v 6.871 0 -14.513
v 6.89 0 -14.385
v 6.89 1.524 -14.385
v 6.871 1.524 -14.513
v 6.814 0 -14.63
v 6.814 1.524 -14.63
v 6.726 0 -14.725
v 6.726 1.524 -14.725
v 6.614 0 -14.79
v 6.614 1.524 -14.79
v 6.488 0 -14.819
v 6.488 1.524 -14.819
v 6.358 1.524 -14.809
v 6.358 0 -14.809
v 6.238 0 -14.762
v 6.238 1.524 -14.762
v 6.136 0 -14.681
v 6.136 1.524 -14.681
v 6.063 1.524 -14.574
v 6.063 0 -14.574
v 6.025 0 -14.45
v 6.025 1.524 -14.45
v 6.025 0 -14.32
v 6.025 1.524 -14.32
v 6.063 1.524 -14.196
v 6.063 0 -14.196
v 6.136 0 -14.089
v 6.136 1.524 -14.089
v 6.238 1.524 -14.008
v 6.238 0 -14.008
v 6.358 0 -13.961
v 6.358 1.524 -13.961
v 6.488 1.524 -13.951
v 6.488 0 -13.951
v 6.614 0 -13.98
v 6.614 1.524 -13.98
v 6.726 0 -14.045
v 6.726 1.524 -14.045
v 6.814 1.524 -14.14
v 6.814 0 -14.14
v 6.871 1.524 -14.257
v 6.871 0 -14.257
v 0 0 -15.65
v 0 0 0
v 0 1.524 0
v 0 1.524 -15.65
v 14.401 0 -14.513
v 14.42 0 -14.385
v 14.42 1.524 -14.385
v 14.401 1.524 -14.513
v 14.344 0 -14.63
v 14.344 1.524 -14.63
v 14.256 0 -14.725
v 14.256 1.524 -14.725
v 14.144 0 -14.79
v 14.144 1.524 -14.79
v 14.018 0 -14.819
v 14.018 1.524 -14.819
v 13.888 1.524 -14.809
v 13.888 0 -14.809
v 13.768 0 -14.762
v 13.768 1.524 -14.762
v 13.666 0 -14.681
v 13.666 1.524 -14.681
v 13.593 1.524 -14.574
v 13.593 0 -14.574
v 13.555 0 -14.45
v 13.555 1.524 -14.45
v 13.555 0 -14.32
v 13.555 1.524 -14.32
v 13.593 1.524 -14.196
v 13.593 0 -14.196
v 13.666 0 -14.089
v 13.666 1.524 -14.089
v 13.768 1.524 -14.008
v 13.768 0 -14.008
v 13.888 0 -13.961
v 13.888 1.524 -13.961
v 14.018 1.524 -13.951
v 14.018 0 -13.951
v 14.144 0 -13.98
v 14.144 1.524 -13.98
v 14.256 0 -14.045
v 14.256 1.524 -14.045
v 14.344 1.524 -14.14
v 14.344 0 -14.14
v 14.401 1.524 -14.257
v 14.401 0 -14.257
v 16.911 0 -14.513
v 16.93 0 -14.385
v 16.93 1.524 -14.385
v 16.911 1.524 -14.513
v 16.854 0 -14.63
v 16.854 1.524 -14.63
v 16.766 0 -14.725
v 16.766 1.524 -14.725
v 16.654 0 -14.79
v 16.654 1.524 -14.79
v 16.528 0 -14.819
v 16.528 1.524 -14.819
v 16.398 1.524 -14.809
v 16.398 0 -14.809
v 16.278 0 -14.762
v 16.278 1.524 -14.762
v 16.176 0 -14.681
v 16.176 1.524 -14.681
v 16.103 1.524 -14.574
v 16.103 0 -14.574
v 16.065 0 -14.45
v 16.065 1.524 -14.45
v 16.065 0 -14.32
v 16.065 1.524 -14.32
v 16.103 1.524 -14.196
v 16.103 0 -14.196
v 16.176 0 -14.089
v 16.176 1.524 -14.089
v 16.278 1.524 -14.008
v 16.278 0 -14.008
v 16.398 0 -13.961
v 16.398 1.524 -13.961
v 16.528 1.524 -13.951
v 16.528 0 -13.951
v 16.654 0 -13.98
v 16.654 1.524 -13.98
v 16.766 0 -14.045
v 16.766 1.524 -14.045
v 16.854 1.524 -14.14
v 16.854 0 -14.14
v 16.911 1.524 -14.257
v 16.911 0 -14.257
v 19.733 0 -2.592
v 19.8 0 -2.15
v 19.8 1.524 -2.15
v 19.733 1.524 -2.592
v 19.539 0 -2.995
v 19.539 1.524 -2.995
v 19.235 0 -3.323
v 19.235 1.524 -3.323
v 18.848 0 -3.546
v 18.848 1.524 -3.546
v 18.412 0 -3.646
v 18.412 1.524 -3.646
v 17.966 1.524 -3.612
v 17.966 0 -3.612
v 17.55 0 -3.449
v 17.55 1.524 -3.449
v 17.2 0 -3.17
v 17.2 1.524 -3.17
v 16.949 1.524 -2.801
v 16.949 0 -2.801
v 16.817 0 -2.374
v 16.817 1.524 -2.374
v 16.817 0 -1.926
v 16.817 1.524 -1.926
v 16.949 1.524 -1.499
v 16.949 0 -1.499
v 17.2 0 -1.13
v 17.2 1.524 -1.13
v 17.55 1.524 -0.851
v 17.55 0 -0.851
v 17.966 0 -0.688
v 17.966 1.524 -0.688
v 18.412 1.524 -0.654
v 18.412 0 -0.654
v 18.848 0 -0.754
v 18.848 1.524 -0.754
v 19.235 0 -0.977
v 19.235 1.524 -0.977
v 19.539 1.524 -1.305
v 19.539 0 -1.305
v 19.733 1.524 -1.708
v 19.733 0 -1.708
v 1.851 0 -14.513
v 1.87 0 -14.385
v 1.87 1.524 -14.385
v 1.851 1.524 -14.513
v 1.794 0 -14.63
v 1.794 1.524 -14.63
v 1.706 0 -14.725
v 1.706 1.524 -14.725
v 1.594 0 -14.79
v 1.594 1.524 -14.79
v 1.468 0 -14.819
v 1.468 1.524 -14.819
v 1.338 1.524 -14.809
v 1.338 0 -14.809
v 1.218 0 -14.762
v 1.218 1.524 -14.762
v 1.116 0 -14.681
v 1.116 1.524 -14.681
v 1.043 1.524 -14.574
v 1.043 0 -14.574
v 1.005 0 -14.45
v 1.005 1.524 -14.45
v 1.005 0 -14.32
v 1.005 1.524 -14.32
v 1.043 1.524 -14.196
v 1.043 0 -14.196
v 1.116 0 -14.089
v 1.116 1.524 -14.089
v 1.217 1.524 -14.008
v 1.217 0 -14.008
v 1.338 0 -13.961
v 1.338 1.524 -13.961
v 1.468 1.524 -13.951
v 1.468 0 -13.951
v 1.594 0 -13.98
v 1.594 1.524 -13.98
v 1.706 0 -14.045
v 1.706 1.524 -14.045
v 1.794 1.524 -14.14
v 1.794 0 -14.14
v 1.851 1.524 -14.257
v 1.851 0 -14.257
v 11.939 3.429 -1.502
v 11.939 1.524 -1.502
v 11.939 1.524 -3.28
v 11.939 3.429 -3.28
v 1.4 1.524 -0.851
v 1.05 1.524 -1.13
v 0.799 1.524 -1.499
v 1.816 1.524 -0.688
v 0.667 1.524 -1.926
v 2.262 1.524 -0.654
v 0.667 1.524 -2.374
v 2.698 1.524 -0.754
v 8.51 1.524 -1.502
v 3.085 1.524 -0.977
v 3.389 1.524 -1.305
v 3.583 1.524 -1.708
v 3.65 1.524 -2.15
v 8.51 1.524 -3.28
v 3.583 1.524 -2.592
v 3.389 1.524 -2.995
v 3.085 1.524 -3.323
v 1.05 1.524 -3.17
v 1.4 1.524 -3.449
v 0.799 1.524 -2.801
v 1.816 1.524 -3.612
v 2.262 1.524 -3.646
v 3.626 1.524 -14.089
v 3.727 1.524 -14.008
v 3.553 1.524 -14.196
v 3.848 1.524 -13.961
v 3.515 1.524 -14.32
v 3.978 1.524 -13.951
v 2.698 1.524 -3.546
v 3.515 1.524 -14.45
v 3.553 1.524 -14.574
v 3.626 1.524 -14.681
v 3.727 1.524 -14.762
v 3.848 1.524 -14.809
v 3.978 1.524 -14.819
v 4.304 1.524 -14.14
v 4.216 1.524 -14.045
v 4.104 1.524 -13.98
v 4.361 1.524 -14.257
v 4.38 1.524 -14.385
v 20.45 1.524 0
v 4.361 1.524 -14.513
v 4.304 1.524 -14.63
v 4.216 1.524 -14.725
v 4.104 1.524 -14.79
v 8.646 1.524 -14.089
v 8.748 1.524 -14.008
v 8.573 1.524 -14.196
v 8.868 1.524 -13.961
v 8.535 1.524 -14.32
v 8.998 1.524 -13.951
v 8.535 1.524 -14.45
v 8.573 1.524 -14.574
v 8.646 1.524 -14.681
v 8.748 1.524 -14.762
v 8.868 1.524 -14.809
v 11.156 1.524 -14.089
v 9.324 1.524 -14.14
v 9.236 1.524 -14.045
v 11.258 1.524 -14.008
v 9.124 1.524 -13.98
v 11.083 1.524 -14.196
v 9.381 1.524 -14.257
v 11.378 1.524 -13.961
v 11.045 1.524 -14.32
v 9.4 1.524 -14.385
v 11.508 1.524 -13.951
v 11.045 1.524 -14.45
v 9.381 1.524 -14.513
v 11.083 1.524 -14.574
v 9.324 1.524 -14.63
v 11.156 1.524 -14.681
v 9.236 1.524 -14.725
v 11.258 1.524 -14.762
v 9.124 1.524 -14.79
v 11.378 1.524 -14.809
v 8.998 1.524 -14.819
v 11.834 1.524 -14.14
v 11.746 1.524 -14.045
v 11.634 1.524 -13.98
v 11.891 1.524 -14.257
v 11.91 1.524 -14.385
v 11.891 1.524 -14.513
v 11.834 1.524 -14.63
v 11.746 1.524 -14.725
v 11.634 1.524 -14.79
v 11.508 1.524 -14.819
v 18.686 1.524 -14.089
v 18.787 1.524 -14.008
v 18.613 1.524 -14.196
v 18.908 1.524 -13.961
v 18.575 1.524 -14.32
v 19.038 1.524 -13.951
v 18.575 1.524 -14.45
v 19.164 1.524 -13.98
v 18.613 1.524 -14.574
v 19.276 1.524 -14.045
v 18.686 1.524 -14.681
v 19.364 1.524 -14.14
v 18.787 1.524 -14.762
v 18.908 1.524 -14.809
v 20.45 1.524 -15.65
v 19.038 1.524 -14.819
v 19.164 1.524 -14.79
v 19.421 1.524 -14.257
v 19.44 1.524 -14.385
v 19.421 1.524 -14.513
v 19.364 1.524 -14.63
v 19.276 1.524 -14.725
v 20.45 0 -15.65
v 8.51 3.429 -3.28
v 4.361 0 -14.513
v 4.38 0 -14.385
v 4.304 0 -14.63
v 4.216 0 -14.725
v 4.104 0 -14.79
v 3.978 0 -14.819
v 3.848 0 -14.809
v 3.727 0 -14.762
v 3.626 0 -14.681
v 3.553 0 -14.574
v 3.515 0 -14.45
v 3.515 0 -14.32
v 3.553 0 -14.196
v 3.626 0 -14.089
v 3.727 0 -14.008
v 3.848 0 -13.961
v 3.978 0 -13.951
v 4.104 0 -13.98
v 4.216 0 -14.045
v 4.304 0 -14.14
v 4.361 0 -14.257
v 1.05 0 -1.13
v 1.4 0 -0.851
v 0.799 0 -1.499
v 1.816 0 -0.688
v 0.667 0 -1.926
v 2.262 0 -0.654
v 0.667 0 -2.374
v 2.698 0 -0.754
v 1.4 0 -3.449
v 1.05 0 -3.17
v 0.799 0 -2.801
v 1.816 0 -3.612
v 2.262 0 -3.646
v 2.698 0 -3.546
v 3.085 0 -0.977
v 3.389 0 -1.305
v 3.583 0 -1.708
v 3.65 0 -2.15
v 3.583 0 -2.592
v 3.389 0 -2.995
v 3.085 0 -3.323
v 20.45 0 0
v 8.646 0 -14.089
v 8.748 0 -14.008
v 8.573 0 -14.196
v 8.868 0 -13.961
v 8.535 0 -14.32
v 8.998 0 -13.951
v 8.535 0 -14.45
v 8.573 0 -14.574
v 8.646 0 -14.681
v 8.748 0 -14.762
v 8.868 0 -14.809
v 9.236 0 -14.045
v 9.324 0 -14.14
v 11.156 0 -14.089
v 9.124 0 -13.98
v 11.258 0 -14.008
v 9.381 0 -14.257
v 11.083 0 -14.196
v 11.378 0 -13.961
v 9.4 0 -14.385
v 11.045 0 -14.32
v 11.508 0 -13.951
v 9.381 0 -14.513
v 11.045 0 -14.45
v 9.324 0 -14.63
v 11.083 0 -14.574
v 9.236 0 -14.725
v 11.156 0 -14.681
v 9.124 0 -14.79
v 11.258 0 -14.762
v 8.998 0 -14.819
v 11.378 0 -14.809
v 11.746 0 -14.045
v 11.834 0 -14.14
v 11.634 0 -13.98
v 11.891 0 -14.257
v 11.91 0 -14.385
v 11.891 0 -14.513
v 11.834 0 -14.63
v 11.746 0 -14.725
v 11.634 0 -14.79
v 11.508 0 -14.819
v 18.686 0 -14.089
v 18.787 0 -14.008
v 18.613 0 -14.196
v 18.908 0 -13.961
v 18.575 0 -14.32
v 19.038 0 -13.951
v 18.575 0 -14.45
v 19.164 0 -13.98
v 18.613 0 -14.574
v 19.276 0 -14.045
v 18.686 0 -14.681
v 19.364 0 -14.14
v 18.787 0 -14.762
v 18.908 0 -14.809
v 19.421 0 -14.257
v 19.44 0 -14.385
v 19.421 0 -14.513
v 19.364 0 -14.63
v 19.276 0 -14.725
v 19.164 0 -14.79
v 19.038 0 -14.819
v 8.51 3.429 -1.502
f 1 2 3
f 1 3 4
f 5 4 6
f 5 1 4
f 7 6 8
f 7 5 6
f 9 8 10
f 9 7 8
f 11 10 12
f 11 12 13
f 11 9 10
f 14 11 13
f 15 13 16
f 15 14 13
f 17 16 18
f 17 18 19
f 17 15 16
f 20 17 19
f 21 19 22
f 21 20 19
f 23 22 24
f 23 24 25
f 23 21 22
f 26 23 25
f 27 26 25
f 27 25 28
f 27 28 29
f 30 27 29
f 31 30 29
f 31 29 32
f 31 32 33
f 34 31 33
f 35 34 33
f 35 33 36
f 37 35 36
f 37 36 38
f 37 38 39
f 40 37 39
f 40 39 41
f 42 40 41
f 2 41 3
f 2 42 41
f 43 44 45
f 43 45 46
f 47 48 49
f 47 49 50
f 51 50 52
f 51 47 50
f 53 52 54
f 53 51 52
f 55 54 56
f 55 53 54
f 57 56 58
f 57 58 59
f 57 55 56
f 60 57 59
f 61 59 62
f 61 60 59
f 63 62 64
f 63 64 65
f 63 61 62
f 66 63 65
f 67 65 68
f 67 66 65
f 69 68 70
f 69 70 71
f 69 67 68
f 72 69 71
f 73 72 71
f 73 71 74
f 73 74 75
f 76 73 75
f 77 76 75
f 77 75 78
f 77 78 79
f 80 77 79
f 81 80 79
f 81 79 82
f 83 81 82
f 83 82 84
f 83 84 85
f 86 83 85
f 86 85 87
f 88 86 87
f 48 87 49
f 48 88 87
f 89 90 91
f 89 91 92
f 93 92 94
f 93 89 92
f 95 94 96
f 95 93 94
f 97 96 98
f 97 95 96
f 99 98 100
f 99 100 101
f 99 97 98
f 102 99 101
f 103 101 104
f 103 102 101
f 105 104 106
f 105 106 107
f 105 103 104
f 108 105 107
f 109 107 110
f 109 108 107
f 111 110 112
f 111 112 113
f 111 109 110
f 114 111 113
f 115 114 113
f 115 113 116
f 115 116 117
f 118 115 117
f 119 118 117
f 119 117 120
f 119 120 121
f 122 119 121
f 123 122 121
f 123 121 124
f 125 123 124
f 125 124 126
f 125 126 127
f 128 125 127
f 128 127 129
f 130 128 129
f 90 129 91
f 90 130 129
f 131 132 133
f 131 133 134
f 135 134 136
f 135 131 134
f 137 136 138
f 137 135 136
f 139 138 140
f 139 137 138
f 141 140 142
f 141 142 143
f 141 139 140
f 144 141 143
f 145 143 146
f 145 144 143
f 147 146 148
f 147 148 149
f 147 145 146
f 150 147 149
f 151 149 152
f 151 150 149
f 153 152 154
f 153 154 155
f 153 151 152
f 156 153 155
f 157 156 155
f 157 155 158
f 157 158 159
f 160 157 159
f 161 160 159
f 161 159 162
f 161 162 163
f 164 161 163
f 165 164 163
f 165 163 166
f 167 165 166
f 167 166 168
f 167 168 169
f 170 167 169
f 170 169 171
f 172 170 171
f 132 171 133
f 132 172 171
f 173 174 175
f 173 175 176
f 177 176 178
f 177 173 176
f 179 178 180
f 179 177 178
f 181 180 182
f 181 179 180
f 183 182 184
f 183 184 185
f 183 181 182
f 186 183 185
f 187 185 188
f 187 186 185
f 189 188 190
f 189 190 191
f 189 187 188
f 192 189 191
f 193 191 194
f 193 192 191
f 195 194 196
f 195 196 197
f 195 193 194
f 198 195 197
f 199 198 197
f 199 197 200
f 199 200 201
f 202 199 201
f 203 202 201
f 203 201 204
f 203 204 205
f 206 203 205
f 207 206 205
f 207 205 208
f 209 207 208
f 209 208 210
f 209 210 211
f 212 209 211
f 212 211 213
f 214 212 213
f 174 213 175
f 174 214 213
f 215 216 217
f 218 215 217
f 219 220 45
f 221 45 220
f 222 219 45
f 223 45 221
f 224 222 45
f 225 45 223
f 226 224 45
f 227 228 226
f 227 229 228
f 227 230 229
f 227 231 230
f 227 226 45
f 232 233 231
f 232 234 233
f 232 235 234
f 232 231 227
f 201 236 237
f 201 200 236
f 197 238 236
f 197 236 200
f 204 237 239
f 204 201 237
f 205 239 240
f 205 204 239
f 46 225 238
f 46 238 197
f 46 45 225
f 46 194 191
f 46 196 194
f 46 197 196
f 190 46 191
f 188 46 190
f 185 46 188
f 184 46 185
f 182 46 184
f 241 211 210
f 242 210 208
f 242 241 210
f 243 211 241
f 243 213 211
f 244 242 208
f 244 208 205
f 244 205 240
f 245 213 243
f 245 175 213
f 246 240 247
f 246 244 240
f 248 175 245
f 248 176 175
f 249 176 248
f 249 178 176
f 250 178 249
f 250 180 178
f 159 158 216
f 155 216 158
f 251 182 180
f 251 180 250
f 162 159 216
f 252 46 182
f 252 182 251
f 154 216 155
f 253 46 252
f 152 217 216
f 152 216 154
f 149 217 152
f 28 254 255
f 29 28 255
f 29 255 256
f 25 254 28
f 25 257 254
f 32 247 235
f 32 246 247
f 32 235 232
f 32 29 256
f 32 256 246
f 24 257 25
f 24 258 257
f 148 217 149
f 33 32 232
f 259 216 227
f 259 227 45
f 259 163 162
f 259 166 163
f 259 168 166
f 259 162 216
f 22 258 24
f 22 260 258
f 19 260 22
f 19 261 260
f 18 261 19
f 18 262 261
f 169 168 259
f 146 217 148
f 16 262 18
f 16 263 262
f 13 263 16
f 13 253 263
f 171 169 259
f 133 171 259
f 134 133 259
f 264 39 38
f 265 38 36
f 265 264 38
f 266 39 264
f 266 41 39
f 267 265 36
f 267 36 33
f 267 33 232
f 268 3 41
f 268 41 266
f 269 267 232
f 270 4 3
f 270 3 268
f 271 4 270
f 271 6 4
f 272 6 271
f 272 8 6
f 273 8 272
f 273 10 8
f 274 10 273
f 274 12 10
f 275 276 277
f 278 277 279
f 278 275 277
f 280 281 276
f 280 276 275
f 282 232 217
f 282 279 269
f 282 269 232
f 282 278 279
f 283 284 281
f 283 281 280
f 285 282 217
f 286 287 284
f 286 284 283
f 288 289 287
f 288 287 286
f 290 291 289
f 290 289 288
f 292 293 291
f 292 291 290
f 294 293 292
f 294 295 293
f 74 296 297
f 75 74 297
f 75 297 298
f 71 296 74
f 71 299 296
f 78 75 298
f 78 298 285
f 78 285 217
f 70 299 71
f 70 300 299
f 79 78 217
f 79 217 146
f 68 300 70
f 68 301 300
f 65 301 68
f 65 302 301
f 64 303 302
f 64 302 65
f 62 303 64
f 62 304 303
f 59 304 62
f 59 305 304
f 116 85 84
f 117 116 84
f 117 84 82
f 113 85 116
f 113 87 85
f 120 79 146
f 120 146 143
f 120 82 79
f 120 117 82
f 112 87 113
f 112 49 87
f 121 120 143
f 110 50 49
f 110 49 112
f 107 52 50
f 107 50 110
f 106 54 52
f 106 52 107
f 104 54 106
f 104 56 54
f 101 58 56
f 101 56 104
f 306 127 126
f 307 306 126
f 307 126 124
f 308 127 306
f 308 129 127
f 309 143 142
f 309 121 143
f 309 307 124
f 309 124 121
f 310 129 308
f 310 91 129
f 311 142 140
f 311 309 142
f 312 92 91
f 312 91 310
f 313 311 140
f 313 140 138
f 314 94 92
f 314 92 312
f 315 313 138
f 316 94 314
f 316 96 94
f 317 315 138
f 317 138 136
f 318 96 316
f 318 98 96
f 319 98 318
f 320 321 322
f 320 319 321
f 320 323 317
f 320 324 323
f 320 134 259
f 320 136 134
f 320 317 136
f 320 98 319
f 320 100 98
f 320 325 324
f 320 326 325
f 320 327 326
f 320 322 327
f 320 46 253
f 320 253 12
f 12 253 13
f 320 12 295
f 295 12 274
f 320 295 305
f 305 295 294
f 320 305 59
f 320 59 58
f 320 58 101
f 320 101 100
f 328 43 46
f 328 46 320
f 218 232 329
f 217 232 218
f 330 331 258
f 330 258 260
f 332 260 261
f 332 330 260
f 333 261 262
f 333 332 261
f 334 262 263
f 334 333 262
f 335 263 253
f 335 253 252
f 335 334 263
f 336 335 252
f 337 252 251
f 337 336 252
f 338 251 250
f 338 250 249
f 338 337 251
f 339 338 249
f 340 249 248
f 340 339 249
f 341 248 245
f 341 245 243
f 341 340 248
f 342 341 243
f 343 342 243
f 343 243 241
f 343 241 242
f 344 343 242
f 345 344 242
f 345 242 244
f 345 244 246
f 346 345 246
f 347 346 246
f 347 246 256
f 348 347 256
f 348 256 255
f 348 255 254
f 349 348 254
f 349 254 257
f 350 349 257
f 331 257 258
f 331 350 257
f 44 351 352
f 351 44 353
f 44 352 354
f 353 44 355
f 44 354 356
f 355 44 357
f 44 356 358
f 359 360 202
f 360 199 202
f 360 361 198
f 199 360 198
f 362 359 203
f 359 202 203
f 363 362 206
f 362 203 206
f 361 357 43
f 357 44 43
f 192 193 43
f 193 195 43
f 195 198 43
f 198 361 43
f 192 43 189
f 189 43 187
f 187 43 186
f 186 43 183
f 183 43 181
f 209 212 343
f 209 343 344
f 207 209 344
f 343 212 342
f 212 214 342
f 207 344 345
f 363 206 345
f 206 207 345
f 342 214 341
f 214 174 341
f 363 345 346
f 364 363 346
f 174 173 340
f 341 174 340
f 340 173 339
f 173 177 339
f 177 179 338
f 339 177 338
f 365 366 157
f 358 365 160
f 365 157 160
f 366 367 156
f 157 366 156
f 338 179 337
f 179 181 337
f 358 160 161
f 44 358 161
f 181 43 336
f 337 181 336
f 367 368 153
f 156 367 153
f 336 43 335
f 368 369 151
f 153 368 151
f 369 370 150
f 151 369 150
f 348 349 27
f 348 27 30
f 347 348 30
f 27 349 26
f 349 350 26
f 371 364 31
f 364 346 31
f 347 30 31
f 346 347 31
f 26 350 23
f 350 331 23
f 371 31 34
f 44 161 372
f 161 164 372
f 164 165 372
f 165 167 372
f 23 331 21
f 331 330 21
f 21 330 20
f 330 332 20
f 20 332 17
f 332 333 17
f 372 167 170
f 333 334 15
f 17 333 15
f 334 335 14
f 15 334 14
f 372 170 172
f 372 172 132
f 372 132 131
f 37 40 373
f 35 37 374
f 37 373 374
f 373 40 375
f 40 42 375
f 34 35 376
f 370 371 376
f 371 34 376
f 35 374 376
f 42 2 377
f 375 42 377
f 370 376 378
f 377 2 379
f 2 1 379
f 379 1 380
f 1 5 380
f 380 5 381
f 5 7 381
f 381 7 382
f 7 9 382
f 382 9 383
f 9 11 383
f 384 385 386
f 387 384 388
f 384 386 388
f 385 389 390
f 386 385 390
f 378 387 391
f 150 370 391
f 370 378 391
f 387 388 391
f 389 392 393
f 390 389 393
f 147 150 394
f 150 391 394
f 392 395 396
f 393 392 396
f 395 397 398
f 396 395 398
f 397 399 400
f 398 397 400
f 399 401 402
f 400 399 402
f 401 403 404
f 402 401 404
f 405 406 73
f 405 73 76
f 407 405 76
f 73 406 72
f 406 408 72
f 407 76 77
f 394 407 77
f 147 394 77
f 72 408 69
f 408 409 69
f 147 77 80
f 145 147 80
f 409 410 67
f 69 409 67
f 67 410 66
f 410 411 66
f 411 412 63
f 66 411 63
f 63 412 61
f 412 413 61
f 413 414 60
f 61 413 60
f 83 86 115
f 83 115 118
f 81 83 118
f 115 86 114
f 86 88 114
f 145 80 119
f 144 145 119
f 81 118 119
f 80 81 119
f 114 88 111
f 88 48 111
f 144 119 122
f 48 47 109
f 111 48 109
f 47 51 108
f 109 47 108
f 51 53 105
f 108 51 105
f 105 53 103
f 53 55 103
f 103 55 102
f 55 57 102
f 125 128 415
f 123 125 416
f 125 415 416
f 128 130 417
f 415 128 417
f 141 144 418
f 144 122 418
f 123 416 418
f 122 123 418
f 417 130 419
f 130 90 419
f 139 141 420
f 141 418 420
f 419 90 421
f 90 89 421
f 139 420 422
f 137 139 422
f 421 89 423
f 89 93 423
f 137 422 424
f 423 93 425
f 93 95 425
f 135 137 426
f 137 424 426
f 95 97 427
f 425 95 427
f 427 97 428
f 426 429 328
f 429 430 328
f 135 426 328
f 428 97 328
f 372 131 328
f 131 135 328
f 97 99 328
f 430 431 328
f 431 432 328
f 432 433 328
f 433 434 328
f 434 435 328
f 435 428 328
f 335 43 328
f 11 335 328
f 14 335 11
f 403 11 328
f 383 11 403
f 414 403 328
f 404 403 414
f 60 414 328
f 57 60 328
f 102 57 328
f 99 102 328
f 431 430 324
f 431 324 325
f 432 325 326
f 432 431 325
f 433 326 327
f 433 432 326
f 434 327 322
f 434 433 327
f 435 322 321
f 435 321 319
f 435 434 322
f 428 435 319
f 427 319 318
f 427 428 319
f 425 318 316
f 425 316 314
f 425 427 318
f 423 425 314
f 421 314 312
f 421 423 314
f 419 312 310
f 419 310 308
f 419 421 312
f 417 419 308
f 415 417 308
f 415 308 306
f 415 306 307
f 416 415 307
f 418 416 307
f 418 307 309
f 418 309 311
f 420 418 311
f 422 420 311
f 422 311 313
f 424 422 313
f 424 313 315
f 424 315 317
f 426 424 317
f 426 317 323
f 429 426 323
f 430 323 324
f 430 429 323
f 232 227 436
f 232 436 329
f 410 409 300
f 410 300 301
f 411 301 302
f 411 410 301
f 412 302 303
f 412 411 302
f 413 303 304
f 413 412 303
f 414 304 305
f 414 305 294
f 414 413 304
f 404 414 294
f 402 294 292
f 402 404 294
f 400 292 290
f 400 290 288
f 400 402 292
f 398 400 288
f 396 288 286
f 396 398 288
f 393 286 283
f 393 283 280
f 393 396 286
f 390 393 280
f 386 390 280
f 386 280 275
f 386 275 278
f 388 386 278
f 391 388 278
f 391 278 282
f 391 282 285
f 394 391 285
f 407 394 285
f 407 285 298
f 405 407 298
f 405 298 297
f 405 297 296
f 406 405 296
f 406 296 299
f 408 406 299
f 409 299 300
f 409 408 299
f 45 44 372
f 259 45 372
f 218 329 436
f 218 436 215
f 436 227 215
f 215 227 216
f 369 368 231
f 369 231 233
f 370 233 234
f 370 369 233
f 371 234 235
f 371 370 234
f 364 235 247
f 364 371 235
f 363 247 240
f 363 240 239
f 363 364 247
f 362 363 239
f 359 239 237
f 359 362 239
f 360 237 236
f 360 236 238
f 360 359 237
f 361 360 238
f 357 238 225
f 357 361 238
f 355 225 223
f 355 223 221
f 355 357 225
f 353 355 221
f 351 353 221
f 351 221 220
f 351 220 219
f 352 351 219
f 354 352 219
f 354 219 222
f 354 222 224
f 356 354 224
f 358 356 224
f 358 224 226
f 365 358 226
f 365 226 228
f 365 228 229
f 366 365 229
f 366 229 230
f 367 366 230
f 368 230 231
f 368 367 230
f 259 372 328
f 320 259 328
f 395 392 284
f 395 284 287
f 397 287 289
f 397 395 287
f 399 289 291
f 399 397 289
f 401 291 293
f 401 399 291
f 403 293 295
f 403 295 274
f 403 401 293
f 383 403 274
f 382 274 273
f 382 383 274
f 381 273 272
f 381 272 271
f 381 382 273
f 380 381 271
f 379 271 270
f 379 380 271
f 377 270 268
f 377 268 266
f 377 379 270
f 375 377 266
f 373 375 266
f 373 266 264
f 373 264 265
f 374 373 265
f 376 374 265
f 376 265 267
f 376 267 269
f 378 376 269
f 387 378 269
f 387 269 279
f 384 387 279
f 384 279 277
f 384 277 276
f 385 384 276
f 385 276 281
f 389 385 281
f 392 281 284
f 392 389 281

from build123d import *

# Parameters (mm, degrees)
SKETCH1_W           = 20.45
SKETCH1_H           = 15.65
SKETCH1_R           = 1.5
SKETCH1_R_2         = 0.435
BOSS_EXTRUDE1_DEPTH = 1.524
SKETCH2_W           = 3.429
SKETCH2_H           = 1.778
BOSS_EXTRUDE2_DEPTH = 1.905


with BuildPart() as part:
    # Sketch1 → Boss-Extrude1 (new body)
    with BuildSketch(Plane(origin=(0, 0, 0), x_dir=(1, 0, 0), z_dir=(0, 1, 0))):
        with Locations((10.225, 7.825)):
            Rectangle(SKETCH1_W, SKETCH1_H)
        with Locations((2.15, 2.15)):
            Circle(SKETCH1_R, mode=Mode.SUBTRACT)
        with Locations((18.3, 2.15)):
            Circle(SKETCH1_R, mode=Mode.SUBTRACT)
        with Locations((1.435, 14.385)):
            Circle(SKETCH1_R_2, mode=Mode.SUBTRACT)
        with Locations((8.965, 14.385)):
            Circle(SKETCH1_R_2, mode=Mode.SUBTRACT)
        with Locations((6.455, 14.385)):
            Circle(SKETCH1_R_2, mode=Mode.SUBTRACT)
        with Locations((13.985, 14.385)):
            Circle(SKETCH1_R_2, mode=Mode.SUBTRACT)
        with Locations((11.475, 14.385)):
            Circle(SKETCH1_R_2, mode=Mode.SUBTRACT)
        with Locations((3.945, 14.385)):
            Circle(SKETCH1_R_2, mode=Mode.SUBTRACT)
        with Locations((16.495, 14.385)):
            Circle(SKETCH1_R_2, mode=Mode.SUBTRACT)
        with Locations((19.005, 14.385)):
            Circle(SKETCH1_R_2, mode=Mode.SUBTRACT)
    extrude(amount=BOSS_EXTRUDE1_DEPTH)

    # Sketch2 → Boss-Extrude2 (add)
    with BuildSketch(Plane(origin=(0, 1.524, 0), x_dir=(1, 0, 0), z_dir=(0, 1, 0))):
        with Locations((10.225, 2.391364263)):
            Rectangle(SKETCH2_W, SKETCH2_H)
    extrude(amount=BOSS_EXTRUDE2_DEPTH)


solid = part.part
